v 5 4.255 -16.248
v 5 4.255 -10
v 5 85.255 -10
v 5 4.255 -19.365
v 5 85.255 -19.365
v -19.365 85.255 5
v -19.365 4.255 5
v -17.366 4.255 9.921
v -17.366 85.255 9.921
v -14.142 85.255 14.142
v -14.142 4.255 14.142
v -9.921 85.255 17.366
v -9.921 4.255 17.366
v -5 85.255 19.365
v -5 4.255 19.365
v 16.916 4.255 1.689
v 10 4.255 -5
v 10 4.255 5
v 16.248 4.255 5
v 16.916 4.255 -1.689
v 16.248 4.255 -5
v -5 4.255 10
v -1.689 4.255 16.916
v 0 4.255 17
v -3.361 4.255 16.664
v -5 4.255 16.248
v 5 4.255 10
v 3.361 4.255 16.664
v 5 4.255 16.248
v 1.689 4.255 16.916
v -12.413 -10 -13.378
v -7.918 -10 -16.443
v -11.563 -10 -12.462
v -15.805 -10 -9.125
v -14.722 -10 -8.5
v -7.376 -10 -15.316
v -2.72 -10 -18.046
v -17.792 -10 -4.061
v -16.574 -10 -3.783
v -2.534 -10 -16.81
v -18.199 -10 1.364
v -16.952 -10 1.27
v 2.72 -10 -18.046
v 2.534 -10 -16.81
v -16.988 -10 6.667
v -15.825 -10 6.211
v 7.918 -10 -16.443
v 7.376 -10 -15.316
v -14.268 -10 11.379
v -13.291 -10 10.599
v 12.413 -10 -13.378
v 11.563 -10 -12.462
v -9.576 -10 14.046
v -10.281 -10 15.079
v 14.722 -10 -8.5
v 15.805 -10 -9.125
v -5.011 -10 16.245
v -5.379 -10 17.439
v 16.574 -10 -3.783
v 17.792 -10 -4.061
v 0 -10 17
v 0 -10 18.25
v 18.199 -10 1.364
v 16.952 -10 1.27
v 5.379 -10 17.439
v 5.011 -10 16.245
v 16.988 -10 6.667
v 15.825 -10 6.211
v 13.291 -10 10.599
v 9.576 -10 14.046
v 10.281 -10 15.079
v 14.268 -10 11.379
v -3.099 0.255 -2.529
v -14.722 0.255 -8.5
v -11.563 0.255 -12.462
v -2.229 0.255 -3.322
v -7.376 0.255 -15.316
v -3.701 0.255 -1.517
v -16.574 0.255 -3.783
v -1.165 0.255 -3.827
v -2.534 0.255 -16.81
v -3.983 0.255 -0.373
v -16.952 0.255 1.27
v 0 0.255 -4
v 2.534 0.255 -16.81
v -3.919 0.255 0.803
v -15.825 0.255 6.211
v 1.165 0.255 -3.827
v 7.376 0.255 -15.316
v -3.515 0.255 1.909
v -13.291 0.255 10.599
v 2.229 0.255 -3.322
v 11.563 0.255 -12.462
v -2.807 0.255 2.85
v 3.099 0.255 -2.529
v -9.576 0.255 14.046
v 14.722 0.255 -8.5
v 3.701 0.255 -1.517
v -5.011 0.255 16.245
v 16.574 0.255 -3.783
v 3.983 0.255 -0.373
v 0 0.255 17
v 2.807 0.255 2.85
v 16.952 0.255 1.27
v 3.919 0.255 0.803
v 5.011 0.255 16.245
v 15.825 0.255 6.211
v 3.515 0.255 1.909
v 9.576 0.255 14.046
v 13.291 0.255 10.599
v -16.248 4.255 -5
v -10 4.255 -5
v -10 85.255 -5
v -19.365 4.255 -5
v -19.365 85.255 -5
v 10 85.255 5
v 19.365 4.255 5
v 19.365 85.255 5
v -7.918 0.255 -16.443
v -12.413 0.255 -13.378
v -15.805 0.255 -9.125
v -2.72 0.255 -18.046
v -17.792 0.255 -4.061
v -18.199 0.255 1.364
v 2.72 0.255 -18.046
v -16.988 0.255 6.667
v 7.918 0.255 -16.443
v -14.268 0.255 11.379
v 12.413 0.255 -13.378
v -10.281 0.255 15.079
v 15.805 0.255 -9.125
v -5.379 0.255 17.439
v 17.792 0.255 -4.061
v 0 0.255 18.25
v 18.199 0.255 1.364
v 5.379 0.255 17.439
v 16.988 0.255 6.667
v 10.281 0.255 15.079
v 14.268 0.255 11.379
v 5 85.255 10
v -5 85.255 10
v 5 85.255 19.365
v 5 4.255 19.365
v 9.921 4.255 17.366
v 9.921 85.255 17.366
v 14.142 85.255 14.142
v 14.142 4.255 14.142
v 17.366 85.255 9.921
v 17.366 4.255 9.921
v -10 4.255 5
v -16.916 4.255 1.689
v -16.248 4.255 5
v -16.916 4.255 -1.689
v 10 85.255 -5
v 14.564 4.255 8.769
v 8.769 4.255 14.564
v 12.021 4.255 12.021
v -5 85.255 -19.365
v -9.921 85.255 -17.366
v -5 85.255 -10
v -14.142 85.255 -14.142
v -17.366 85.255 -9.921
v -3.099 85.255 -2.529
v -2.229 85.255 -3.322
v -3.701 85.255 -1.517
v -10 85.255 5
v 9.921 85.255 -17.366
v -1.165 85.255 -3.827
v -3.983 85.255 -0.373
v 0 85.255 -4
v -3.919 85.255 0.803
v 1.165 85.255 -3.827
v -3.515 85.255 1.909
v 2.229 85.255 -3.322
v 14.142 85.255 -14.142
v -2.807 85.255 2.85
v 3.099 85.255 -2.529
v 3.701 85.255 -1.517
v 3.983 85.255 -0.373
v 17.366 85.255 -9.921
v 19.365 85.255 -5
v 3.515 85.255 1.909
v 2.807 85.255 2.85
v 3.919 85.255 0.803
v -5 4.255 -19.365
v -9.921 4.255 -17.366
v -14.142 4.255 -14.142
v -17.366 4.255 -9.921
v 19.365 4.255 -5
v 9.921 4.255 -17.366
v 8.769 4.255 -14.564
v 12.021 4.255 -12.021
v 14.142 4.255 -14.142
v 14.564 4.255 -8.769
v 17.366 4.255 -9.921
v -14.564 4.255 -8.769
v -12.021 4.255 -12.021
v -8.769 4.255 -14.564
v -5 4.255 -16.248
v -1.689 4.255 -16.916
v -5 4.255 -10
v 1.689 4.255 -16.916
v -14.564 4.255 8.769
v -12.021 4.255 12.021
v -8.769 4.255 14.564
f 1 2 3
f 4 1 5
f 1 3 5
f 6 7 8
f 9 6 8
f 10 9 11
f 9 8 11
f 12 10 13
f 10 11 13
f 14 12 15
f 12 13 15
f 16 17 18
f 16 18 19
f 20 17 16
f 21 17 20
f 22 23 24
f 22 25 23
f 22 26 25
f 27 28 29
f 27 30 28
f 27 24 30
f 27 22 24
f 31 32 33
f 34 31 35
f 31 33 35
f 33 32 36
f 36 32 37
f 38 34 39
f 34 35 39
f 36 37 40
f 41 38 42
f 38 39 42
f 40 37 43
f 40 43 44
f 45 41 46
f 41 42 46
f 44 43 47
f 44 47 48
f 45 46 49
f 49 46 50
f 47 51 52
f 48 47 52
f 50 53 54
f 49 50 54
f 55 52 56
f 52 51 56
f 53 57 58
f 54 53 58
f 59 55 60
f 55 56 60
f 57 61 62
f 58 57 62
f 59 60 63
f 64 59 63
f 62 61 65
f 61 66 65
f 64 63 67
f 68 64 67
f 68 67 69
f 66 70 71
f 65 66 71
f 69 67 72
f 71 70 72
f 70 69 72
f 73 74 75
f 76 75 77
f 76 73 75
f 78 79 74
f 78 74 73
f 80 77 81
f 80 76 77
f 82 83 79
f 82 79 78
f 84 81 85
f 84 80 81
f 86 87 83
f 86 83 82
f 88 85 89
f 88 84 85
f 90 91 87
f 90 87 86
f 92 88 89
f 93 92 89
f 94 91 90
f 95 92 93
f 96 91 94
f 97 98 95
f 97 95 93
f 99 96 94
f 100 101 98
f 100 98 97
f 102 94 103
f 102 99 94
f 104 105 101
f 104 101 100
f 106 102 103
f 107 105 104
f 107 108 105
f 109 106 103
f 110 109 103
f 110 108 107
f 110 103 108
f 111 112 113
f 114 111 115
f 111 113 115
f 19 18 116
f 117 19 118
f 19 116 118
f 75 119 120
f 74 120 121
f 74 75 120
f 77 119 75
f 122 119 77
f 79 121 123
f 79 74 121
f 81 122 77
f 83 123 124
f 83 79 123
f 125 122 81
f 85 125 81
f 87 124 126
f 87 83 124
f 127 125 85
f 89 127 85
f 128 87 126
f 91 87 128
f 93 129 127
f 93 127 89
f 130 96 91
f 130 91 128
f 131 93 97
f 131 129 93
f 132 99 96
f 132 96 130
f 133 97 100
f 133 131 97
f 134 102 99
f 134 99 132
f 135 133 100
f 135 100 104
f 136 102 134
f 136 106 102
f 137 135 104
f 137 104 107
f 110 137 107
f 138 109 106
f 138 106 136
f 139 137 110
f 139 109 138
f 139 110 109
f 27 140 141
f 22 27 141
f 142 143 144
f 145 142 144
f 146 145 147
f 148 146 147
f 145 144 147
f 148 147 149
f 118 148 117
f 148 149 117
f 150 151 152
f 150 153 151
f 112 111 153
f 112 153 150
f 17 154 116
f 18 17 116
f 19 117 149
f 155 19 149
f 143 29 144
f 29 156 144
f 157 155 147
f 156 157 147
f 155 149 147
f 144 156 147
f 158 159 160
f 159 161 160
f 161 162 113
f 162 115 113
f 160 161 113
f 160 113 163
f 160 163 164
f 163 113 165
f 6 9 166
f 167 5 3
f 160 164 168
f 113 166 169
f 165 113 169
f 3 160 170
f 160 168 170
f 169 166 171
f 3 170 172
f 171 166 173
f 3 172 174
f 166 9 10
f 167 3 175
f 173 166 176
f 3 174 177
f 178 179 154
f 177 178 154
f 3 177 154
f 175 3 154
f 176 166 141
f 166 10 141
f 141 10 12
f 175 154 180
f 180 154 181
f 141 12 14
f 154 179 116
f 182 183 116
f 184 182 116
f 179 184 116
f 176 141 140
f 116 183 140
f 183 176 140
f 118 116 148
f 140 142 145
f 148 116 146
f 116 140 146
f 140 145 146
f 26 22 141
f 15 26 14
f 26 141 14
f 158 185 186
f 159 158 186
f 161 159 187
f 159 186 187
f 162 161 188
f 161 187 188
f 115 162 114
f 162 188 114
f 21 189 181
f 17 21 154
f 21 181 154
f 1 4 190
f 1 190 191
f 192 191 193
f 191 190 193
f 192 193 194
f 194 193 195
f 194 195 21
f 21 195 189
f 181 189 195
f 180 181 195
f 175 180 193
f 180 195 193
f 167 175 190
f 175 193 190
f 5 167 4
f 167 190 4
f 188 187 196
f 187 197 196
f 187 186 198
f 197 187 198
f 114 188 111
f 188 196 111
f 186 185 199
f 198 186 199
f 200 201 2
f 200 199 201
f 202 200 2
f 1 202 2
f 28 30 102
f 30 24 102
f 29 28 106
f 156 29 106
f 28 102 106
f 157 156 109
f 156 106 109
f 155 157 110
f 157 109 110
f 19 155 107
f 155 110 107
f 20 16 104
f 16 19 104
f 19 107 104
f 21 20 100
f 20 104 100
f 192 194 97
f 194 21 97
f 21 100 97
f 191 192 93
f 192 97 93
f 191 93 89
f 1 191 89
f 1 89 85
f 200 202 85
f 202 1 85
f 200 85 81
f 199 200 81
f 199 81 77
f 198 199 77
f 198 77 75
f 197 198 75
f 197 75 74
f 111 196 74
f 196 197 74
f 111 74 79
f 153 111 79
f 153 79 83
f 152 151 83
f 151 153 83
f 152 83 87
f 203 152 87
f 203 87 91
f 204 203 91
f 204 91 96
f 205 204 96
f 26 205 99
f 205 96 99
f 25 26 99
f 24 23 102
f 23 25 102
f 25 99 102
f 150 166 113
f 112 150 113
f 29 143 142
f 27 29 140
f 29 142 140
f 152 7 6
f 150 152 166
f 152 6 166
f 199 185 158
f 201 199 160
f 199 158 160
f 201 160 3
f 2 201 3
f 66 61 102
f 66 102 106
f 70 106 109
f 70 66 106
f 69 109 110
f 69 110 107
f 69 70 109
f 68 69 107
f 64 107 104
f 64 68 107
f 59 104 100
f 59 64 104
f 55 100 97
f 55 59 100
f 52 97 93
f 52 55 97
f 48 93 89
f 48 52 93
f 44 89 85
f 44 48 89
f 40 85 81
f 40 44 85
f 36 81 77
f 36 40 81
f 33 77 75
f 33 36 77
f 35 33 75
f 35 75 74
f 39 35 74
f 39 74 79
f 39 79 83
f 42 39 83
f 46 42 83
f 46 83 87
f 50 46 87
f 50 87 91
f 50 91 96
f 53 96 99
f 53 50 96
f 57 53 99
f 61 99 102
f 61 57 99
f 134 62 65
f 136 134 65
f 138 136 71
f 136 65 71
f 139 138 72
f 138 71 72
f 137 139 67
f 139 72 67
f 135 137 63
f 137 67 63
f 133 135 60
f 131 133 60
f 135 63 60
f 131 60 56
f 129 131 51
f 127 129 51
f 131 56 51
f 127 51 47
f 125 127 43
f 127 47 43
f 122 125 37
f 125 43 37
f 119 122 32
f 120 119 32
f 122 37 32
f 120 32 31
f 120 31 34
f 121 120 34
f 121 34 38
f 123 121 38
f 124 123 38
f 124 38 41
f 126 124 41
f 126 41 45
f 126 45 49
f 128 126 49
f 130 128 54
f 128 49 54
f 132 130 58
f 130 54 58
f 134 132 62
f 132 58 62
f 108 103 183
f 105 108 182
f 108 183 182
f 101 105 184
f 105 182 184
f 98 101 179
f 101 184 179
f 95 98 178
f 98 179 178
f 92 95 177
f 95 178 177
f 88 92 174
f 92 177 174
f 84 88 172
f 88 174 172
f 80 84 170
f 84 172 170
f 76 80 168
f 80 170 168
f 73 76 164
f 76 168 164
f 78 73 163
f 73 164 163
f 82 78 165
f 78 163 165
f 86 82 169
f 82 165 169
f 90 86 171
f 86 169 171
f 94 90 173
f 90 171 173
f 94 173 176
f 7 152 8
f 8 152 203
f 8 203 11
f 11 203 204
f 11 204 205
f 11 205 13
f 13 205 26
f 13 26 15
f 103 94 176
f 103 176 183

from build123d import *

# Parameters (mm, degrees)
BOSS_EXTRUDE8_DEPTH           = 0.255
BOSS_EXTRUDE8_DEPTH_BACK      = 10
SKETCH13_R                    = 18.25
SKETCH13_R_2                  = 17
SKETCH14_R                    = 17
SKETCH14_R_2                  = 4
BOSS_EXTRUDE17_DEPTH          = 5
CONNECTOR_CYLINDER_DEPTH      = 80
CONNECTOR_CYLINDER_DEPTH_BACK = 1
SKETCH21_R                    = 20
SKETCH23_R                    = 4
CUT_EXTRUDE4_DEPTH            = 96.3
CONNECTOR_CYLINDER_CUT_DEPTH  = 81
KEY_CUT_DEPTH                 = 85


with BuildPart() as part:
    # Sketch13 → Boss-Extrude8 (new, two sides: drawn at the far end of the back side and taken through both)
    with BuildSketch(Plane(origin=(0, 0, 0), x_dir=(1, 0, 0), z_dir=(0, 1, 0)).offset(-BOSS_EXTRUDE8_DEPTH_BACK)):
        with Locations(Location((0, 0, 0), (0, 0, 270))):
            Circle(SKETCH13_R)
        with Locations(Location((0, 0, 0), (0, 0, 270))):
            Circle(SKETCH13_R_2, mode=Mode.SUBTRACT)
    extrude(amount=BOSS_EXTRUDE8_DEPTH + BOSS_EXTRUDE8_DEPTH_BACK)


with BuildPart() as body_2:
    # Sketch14 → Boss-Extrude17 (new body)
    # profile 1 of 2: a face of its own
    with BuildSketch(Plane(origin=(0, 0.255, 0), x_dir=(1, 0, 0), z_dir=(0, 1, 0))):
        with Locations(Location((0, 0, 0), (0, 0, 270))):
            Circle(SKETCH14_R)
        Circle(SKETCH14_R_2, mode=Mode.SUBTRACT)
    # profile 2 of 2: a face of its own
    with BuildSketch(Plane(origin=(0, 0.255, 0), x_dir=(1, 0, 0), z_dir=(0, 1, 0))):
        with BuildLine():
            ThreePointArc((2.066246597, 3.425), (0, 4), (-2.066246597, 3.425))
            Line((-2.066246597, 3.425), (0, 3.425))
            Line((0, 3.425), (2.066246597, 3.425))
        make_face()
    extrude(amount=BOSS_EXTRUDE17_DEPTH)

    # Sketch21 → Connector Cylinder (add, two sides: drawn at the far end of the back side and taken through both)
    with BuildSketch(Plane(origin=(0, 5.255, 0), x_dir=(1, 0, 0), z_dir=(0, 1, 0)).offset(-CONNECTOR_CYLINDER_DEPTH_BACK)):
        with Locations(Location((0, 0, 0), (0, 0, 270))):
            Circle(SKETCH21_R)
    extrude(amount=CONNECTOR_CYLINDER_DEPTH + CONNECTOR_CYLINDER_DEPTH_BACK)

    # Sketch23 → Cut-Extrude4 (cut)
    with BuildSketch(Plane(origin=(0, 85.255, 0), x_dir=(1, 0, 0), z_dir=(0, 1, 0))):
        with Locations(Location((0, 0, 0), (0, 0, 270))):
            Circle(SKETCH23_R)
    extrude(amount=-CUT_EXTRUDE4_DEPTH, mode=Mode.SUBTRACT)

    # Sketch22 → Connector Cylinder Cut (cut)
    with BuildSketch(Plane(origin=(0, 85.255, 0), x_dir=(1, 0, 0), z_dir=(0, 1, 0))):
        with BuildLine():
            ThreePointArc((-5, -19.364916731), (0, -20), (5, -19.364916731))
            Line((5, -19.364916731), (5, -10))
            Line((5, -10), (-5, -10))
            Line((-5, -10), (-5, -19.364916731))
        make_face()
        with BuildLine():
            ThreePointArc((-19.364916731, 5), (-20, 0), (-19.364916731, -5))
            Line((-19.364916731, -5), (-10, -5))
            Line((-10, -5), (-10, 5))
            Line((-10, 5), (-19.364916731, 5))
        make_face()
        with BuildLine():
            Line((5, 10), (5, 19.364916731))
            ThreePointArc((5, 19.364916731), (0, 20), (-5, 19.364916731))
            Line((-5, 19.364916731), (-5, 10))
            Line((-5, 10), (5, 10))
        make_face()
        with BuildLine():
            Line((9.999996731, 5), (9.999996731, -5))
            Line((9.999996731, -5), (19.364916731, -5))
            ThreePointArc((19.364916731, -5), (19.840593925, -2.52008585), (20, 0))
            ThreePointArc((20, 0), (19.840593925, 2.52008585), (19.364916731, 5))
            Line((19.364916731, 5), (9.999996731, 5))
        make_face()
    extrude(amount=-CONNECTOR_CYLINDER_CUT_DEPTH, mode=Mode.SUBTRACT)

    # Sketch25 → Key Cut (add)
    with BuildSketch(Plane.XZ.offset(-0.255)):
        with BuildLine():
            ThreePointArc((2.80668844, 2.85), (0, 4), (-2.80668844, 2.85))
            Line((-2.80668844, 2.85), (2.80668844, 2.85))
        make_face()
    extrude(amount=-KEY_CUT_DEPTH)


solid = Compound([part.part, body_2.part])
